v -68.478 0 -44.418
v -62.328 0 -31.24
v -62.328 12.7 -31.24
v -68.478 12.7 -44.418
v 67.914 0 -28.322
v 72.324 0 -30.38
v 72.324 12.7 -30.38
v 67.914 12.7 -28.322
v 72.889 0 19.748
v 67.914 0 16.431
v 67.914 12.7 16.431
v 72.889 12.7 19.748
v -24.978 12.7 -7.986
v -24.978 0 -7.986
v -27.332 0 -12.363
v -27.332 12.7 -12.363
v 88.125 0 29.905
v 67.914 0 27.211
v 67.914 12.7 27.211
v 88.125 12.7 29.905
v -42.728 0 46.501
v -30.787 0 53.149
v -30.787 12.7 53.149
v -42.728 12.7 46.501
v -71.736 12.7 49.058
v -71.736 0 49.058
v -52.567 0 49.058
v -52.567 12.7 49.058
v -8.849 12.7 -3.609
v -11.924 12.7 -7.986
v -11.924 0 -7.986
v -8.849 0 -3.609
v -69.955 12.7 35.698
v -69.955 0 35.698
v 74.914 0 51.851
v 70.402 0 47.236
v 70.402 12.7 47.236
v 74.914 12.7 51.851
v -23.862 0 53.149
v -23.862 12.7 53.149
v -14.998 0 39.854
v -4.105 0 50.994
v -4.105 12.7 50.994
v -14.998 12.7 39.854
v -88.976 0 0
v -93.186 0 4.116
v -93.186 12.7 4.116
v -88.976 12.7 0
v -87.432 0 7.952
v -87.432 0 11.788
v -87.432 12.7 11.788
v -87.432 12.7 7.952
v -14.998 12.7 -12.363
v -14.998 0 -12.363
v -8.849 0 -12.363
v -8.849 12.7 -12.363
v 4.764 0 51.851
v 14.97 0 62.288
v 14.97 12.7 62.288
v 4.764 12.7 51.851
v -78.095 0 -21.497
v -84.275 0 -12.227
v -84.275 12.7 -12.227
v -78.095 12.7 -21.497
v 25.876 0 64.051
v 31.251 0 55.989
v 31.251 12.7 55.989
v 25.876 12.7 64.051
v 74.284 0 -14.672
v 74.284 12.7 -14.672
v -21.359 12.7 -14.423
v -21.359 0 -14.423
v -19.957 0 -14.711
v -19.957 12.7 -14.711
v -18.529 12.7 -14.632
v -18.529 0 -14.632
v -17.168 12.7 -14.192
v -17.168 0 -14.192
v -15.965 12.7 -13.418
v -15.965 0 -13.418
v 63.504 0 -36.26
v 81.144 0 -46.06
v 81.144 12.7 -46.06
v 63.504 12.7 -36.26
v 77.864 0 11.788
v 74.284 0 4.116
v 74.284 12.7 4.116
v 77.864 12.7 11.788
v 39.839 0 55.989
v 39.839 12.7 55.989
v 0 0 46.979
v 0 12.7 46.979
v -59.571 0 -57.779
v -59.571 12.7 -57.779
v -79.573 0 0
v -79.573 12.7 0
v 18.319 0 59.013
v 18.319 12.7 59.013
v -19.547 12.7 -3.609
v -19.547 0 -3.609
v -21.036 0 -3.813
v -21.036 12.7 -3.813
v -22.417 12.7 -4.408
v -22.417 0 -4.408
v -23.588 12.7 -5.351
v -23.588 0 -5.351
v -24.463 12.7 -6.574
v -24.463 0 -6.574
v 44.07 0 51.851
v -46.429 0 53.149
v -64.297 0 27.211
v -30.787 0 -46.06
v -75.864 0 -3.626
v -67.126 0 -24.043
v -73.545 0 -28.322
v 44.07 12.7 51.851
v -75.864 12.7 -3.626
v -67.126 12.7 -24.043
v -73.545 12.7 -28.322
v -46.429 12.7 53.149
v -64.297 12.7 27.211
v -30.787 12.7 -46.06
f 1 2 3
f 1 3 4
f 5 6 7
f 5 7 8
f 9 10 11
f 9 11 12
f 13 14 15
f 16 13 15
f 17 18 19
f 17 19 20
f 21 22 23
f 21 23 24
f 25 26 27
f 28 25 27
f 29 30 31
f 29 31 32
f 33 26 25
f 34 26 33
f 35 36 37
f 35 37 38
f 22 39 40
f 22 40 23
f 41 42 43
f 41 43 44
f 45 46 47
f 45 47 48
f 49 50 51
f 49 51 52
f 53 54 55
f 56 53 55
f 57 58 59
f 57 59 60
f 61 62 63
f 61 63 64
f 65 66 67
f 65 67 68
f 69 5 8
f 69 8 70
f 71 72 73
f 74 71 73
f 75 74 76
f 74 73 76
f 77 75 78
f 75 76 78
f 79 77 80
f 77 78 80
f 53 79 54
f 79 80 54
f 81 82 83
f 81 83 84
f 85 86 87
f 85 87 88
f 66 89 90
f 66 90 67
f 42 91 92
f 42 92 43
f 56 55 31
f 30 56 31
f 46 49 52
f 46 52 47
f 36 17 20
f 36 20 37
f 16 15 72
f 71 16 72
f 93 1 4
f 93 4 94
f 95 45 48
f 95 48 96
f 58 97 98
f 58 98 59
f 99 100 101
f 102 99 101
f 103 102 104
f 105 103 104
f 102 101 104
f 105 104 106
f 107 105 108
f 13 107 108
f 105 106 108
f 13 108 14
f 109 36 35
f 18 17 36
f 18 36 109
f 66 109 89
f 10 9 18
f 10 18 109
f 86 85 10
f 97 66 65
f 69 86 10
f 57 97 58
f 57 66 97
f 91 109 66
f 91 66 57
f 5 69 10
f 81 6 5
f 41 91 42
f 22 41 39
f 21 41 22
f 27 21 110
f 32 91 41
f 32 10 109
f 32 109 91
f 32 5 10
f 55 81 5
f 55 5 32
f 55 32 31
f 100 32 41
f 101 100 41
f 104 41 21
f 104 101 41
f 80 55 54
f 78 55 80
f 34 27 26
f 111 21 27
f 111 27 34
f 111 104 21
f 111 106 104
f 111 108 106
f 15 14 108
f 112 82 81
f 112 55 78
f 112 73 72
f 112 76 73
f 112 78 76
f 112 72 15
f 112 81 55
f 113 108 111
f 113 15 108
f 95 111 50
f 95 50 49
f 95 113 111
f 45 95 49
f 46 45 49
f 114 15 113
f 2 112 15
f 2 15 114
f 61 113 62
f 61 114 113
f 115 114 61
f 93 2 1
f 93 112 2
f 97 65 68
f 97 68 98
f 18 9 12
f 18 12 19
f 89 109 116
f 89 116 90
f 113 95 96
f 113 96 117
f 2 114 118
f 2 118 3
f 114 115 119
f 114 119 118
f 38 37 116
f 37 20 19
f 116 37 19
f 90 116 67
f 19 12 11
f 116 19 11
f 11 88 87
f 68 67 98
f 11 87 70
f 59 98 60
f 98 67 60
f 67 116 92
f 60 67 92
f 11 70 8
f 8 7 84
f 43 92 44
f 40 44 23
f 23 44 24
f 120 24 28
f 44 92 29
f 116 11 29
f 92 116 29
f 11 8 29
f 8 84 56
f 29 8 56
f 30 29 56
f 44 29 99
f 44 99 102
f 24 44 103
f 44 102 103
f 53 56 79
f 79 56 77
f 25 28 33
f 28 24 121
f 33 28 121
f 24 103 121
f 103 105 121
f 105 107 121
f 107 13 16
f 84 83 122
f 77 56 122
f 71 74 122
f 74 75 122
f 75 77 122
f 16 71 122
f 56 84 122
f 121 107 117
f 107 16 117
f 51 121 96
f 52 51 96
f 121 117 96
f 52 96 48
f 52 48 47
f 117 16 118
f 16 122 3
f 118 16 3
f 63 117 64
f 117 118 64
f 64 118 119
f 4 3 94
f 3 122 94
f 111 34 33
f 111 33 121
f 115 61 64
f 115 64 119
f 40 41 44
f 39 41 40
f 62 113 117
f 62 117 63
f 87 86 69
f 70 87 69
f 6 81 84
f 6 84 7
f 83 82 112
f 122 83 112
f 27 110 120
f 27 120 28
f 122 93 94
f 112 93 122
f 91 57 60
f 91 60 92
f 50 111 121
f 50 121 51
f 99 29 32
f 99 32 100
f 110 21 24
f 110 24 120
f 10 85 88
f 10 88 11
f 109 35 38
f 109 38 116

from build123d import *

# Parameters (mm, degrees)
BOSS_EXTRUDE1_DEPTH = 12.7


with BuildPart() as part:
    # Sketch1 → Boss-Extrude1 (new body)
    with BuildSketch(Plane(origin=(0, 0, 0), x_dir=(1, 0, 0), z_dir=(0, 1, 0))):
        Polygon((-30.787184834, 46.060147433), (67.424215816, 46.060147433), (81.144259733, 46.060147433), (63.504203269, 36.260116064), (72.324231501, 30.380097243), (67.914217385, 28.322090655), (74.284237775, 14.672046963), (74.284237775, 9.604030741), (74.284237775, -4.116013175), (77.864468212, -11.787935542), (67.914217385, -16.431385928), (72.889342799, -19.748136204), (67.914217385, -27.210824325), (88.124897461, -29.905172646), (70.401780092, -47.236151197), (74.914322429, -51.850796426), (44.070310984, -51.850796426), (39.838958686, -55.98852651), (31.251122176, -55.98852651), (25.875987108, -64.051229112), (18.318515491, -59.012914701), (14.969602654, -62.287730036), (4.763594942, -51.850796426), (0, -46.979418158), (-4.105003947, -50.993595454), (-14.998499331, -39.853618754), (-23.862315978, -53.149343726), (-30.787184834, -53.149343726), (-42.728136767, -46.50148124), (-46.429188064, -53.149343726), (-52.566568213, -49.057756959), (-62.328199505, -49.057756959), (-71.736229619, -49.057756959), (-69.955147384, -35.697612338), (-64.297288709, -27.210824325), (-87.431621883, -11.787935542), (-87.431621883, -7.951974358), (-93.185563658, -4.116013175), (-88.976419646, 0), (-79.572998188, 0), (-75.864455296, 3.626488274), (-84.274708917, 12.227036224), (-78.094687193, 21.497068809), (-73.544672629, 28.322090655), (-67.126218046, 24.043120934), (-62.328199505, 31.240148746), (-68.47808372, 44.418472064), (-59.570897098, 57.779251997), align=None)
        with BuildLine():
            Line((-11.923576625, 7.986340539), (-8.84865392, 3.609452157))
            Line((-8.84865392, 3.609452157), (-19.546747498, 3.609452157))
            ThreePointArc((-19.546747498, 3.609452157), (-23.034496934, 4.839852529), (-24.978177568, 7.986340539))
            Line((-24.978177568, 7.986340539), (-27.332016626, 12.363228921))
            Line((-27.332016626, 12.363228921), (-21.358576046, 14.422806945))
            ThreePointArc((-21.358576046, 14.422806945), (-17.834303779, 14.456028923), (-14.998499331, 12.363228921))
            Line((-14.998499331, 12.363228921), (-8.84865392, 12.363228921))
            Line((-8.84865392, 12.363228921), (-11.923576625, 7.986340539))
        make_face(mode=Mode.SUBTRACT)
    extrude(amount=BOSS_EXTRUDE1_DEPTH)


solid = part.part
